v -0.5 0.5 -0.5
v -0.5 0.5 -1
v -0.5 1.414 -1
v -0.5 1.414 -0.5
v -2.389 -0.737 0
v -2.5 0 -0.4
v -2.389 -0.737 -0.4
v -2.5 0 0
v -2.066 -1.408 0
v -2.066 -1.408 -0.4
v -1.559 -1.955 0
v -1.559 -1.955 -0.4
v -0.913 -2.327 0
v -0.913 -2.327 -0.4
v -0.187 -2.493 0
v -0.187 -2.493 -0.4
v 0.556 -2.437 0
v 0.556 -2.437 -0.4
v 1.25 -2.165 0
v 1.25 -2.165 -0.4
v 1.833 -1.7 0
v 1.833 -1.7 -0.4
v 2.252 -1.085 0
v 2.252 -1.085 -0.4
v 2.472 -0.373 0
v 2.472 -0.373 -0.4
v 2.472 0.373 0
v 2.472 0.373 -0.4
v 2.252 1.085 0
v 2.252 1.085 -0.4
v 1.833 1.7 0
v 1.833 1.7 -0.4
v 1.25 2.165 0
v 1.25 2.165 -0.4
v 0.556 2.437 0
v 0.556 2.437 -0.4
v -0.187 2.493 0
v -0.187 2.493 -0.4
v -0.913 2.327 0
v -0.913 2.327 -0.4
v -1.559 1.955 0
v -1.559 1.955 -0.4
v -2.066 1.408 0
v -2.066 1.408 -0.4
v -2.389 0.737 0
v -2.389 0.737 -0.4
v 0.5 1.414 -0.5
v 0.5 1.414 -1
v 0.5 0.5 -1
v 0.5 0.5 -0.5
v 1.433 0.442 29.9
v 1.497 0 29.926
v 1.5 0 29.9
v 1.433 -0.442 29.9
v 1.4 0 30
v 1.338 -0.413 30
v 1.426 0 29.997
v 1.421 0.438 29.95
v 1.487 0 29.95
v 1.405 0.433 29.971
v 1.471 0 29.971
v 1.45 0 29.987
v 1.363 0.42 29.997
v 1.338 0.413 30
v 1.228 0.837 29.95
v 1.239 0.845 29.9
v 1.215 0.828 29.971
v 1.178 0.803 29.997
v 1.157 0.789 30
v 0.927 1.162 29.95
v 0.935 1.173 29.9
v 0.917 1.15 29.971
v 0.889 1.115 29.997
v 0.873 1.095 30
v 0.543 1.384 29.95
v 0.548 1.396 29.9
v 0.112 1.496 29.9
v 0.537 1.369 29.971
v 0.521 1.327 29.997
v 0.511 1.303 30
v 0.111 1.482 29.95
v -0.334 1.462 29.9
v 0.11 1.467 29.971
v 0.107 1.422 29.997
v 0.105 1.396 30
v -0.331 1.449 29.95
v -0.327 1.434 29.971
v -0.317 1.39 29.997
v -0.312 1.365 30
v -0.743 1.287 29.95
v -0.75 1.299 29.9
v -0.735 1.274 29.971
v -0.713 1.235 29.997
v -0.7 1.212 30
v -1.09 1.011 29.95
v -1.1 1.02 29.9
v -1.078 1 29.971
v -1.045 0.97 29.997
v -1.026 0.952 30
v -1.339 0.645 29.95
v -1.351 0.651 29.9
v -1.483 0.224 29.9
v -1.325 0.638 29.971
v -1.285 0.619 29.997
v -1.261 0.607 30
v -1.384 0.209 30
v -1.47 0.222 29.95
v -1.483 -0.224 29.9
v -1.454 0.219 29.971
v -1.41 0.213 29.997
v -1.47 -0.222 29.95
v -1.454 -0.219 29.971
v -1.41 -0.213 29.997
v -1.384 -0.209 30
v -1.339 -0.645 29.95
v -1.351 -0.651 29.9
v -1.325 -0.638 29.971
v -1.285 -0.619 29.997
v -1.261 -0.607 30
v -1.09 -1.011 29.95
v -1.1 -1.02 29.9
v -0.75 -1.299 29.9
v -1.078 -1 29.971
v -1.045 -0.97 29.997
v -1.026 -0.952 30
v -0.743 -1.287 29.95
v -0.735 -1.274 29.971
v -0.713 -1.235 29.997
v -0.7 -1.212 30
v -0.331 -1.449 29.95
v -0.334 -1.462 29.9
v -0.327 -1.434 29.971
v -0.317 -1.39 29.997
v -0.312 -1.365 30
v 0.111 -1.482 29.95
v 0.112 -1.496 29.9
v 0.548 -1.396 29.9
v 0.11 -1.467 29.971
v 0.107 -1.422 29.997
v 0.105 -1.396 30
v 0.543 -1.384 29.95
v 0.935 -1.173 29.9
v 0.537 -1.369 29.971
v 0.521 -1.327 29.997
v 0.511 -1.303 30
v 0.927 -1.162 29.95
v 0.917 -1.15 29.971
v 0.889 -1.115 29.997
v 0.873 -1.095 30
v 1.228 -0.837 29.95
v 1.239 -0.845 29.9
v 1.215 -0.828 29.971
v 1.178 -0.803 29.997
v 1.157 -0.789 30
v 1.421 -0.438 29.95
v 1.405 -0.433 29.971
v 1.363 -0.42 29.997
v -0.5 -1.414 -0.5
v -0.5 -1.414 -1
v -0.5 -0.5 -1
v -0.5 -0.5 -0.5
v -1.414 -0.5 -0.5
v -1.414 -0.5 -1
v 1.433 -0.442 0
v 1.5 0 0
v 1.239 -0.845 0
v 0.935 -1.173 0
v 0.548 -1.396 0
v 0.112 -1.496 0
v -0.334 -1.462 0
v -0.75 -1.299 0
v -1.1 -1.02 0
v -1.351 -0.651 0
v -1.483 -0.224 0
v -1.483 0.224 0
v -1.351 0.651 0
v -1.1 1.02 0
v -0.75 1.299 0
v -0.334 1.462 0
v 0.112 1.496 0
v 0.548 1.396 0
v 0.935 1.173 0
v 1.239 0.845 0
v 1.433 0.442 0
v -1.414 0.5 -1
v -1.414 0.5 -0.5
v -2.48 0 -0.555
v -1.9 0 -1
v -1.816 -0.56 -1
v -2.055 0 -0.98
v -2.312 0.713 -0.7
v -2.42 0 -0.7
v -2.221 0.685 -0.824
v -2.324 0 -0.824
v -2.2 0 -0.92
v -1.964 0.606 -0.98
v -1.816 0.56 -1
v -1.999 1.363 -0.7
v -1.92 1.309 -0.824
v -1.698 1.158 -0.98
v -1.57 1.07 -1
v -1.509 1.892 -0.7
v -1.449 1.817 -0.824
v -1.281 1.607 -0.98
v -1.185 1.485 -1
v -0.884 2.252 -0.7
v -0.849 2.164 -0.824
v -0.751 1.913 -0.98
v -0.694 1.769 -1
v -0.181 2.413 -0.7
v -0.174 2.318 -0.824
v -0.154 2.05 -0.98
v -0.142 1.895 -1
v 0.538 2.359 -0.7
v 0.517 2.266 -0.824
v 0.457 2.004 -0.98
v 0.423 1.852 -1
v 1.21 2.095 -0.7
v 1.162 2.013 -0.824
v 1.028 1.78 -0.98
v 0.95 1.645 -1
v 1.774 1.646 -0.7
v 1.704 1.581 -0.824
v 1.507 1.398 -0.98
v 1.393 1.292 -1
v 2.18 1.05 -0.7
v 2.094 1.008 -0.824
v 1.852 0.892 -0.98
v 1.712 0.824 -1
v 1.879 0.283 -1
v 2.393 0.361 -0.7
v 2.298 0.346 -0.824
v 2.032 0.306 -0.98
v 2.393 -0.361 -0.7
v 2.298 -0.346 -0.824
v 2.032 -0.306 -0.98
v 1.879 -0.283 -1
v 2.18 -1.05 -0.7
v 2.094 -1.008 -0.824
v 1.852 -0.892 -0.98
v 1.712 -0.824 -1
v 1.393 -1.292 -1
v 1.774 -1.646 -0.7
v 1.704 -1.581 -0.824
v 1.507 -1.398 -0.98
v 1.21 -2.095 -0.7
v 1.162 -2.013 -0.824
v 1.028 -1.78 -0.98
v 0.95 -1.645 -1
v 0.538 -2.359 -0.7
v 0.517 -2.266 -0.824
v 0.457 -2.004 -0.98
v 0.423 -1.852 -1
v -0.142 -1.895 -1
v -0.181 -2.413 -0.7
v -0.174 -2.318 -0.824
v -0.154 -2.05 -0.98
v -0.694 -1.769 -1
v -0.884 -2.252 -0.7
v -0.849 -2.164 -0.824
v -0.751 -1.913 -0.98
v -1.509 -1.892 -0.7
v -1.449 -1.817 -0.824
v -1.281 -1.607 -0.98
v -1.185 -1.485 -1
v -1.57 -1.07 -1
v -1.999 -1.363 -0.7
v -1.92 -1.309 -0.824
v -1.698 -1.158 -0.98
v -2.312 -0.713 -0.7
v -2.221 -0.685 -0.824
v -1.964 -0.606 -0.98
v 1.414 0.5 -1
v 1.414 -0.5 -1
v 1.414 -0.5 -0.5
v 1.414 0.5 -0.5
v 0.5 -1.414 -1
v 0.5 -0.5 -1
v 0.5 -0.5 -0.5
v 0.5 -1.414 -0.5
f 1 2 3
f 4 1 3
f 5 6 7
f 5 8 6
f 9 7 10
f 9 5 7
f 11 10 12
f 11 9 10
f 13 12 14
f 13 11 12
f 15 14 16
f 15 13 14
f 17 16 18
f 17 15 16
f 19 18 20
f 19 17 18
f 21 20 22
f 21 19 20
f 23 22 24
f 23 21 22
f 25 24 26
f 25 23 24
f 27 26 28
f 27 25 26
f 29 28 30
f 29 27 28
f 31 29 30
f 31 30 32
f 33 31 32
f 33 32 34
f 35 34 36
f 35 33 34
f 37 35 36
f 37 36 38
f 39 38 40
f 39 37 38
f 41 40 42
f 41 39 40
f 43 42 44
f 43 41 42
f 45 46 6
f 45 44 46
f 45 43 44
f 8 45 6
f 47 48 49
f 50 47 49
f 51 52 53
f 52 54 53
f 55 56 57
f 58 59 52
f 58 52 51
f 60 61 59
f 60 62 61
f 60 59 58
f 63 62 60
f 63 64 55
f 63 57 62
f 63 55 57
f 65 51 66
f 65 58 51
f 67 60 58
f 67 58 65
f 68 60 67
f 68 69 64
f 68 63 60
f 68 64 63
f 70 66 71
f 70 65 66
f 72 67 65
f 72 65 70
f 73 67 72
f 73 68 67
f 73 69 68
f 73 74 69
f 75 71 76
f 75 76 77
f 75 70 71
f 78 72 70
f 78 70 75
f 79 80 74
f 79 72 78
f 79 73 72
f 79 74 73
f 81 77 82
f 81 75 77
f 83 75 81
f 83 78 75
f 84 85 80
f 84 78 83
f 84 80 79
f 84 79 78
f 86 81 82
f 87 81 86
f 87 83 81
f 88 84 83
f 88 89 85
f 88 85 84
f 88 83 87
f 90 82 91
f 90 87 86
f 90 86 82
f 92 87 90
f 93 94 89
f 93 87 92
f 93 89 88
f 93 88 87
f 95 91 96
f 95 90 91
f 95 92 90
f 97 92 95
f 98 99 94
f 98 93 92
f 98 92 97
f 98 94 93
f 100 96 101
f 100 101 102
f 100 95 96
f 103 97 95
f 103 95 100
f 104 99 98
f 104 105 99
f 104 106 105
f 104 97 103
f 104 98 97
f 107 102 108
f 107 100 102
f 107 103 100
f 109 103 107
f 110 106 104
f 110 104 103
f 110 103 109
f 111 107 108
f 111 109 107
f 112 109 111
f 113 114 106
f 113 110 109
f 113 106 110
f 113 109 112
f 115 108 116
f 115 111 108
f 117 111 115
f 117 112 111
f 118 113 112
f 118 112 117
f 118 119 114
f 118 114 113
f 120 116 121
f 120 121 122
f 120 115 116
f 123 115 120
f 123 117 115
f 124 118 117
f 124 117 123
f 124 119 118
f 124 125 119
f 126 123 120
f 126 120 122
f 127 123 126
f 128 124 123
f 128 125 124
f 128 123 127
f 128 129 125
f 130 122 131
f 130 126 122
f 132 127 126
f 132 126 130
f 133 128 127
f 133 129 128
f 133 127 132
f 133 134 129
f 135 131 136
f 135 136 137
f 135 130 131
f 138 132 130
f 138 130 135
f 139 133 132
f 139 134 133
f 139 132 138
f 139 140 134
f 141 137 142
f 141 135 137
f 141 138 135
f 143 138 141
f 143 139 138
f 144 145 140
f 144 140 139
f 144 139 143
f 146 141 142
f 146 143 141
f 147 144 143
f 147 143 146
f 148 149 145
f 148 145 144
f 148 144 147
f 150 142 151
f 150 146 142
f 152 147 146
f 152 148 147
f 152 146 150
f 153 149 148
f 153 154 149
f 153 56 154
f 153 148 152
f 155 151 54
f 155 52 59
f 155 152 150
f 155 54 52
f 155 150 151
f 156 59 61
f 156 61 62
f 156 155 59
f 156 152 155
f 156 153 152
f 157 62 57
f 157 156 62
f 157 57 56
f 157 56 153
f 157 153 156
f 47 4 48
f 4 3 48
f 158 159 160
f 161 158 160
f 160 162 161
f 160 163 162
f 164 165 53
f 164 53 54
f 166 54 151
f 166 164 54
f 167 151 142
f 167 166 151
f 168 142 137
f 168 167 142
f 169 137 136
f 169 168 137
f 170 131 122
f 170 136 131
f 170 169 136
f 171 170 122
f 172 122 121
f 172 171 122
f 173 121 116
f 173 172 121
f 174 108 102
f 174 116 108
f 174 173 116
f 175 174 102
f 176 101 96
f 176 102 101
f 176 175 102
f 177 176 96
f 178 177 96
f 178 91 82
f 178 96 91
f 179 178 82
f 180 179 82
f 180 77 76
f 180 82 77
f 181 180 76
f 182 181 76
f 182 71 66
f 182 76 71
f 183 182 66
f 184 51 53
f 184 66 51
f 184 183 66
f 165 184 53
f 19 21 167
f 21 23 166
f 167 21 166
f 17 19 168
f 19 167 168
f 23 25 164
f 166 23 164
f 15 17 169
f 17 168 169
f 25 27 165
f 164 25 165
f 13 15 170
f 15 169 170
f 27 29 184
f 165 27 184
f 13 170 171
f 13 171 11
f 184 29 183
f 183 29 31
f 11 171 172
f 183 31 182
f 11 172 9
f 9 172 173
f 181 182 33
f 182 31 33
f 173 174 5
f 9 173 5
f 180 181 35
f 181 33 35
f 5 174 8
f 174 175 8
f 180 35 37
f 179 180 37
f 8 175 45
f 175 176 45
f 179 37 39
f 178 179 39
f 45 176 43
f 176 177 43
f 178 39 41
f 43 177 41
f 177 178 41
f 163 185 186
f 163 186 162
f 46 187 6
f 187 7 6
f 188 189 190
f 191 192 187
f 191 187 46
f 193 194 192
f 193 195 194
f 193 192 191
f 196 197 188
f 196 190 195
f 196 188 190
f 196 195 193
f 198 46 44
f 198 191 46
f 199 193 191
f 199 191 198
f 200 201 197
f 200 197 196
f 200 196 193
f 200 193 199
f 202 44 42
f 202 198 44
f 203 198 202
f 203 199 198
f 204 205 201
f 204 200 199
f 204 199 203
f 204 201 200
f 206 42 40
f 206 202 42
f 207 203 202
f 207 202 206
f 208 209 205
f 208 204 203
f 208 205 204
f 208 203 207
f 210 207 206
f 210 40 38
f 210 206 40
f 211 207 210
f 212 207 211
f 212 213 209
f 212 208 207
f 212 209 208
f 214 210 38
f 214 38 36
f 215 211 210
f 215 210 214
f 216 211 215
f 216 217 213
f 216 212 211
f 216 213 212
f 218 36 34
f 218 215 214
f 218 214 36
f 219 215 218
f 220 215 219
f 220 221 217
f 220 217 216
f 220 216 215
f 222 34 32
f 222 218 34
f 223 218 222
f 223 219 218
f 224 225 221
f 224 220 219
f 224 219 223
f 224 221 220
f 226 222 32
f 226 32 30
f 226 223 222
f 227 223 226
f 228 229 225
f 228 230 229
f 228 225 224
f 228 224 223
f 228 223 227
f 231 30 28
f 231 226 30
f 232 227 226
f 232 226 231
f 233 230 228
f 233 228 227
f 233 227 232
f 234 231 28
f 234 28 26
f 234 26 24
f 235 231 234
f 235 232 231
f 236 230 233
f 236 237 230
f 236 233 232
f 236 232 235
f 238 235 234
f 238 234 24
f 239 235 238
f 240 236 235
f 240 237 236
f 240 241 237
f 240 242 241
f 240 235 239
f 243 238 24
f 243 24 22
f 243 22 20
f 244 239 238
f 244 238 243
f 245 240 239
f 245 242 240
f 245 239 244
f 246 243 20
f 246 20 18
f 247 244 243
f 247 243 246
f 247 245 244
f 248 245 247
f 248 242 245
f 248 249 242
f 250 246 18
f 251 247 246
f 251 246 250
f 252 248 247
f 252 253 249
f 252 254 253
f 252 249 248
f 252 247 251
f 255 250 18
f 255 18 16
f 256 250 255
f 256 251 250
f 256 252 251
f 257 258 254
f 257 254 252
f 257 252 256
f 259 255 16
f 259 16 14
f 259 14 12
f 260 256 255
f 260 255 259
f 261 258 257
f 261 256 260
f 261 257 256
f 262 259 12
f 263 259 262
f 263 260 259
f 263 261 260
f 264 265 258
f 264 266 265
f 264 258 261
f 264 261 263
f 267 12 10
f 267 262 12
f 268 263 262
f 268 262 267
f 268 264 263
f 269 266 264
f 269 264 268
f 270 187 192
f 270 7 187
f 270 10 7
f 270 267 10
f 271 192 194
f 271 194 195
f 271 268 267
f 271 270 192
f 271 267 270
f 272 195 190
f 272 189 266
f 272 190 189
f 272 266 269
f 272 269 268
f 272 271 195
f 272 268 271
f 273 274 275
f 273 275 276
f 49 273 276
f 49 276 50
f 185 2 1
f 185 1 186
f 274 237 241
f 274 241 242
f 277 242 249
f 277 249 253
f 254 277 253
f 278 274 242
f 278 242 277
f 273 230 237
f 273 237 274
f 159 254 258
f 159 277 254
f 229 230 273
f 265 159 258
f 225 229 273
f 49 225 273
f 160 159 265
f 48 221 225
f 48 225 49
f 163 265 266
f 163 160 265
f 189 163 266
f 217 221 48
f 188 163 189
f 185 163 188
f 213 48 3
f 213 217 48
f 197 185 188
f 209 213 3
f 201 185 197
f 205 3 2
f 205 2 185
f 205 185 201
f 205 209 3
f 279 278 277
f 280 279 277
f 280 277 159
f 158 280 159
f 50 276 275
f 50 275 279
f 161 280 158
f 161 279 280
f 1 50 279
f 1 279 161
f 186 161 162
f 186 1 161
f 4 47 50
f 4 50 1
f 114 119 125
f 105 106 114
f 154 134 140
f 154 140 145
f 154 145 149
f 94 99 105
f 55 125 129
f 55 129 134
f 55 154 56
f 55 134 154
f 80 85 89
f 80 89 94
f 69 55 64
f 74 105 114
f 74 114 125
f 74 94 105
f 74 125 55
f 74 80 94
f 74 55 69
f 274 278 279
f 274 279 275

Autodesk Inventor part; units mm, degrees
ref_plane "YZ Plane" through (0, 0, 0) normal (1, 0, 0) x (0, 1, 0)
ref_plane "XZ Plane" through (0, 0, 0) normal (0, 1, 0) x (-1, 0, 0)
ref_plane "XY Plane" through (0, 0, 0) normal (0, 0, 1) x (1, 0, 0)
sketch "Sketch1" plane through (0, 0, 0) normal (0, 0, 1) x (1, 0, 0)
  circle A0 centre (0, 0) radius 1.5
  dimension "d0" = 3
extrude "Extrusion1" add sketch "Sketch1" along normal blind 30
fillet "Fillet1" radius 0.1 1 edges at (-1.5, 0, 30)
sketch "Sketch2" plane through (0, 0, 0) normal (0, 0, -1) x (-1, 0, 0)
  circle A0 centre (0, 0) radius 2.5
  dimension "d4" = 5
extrude "Extrusion2" add sketch "Sketch2" along normal blind 1
sketch "Sketch3" plane through (0, 0, -1) normal (0, 0, -1) x (-1, 0, 0)
  line L0 (-1.4142, 0.5) -> (1.4142, 0.5)
  line L1 (1.4142, 0.5) -> (1.4142, -0.5)
  line L2 (1.4142, -0.5) -> (-1.4142, -0.5)
  line L3 (-1.4142, -0.5) -> (-1.4142, 0.5)
  line L4 (-1.4142, 0.5) -> (1.4142, -0.5) construction
  line L5 (1.4142, 0.5) -> (-1.4142, -0.5) construction
  line L6 (0.5, 1.4142) -> (-0.5, 1.4142)
  line L7 (-0.5, 1.4142) -> (-0.5, -1.4142)
  line L8 (-0.5, -1.4142) -> (0.5, -1.4142)
  line L9 (0.5, -1.4142) -> (0.5, 1.4142)
  line L10 (0.5, 1.4142) -> (-0.5, -1.4142) construction
  line L11 (-0.5, 1.4142) -> (0.5, -1.4142) construction
  point P0 (0, 0)
  point P1 (0, 0)
  point P2 (0, 0)
  dimension "d8" = 1
  dimension "d9" = 1
extrude "Extrusion3" cut sketch "Sketch3" against normal blind 0.5
fillet "Fillet2" radius 0.6 1 edges at (2.5, 0, -1)
properties part number "M3-2"
